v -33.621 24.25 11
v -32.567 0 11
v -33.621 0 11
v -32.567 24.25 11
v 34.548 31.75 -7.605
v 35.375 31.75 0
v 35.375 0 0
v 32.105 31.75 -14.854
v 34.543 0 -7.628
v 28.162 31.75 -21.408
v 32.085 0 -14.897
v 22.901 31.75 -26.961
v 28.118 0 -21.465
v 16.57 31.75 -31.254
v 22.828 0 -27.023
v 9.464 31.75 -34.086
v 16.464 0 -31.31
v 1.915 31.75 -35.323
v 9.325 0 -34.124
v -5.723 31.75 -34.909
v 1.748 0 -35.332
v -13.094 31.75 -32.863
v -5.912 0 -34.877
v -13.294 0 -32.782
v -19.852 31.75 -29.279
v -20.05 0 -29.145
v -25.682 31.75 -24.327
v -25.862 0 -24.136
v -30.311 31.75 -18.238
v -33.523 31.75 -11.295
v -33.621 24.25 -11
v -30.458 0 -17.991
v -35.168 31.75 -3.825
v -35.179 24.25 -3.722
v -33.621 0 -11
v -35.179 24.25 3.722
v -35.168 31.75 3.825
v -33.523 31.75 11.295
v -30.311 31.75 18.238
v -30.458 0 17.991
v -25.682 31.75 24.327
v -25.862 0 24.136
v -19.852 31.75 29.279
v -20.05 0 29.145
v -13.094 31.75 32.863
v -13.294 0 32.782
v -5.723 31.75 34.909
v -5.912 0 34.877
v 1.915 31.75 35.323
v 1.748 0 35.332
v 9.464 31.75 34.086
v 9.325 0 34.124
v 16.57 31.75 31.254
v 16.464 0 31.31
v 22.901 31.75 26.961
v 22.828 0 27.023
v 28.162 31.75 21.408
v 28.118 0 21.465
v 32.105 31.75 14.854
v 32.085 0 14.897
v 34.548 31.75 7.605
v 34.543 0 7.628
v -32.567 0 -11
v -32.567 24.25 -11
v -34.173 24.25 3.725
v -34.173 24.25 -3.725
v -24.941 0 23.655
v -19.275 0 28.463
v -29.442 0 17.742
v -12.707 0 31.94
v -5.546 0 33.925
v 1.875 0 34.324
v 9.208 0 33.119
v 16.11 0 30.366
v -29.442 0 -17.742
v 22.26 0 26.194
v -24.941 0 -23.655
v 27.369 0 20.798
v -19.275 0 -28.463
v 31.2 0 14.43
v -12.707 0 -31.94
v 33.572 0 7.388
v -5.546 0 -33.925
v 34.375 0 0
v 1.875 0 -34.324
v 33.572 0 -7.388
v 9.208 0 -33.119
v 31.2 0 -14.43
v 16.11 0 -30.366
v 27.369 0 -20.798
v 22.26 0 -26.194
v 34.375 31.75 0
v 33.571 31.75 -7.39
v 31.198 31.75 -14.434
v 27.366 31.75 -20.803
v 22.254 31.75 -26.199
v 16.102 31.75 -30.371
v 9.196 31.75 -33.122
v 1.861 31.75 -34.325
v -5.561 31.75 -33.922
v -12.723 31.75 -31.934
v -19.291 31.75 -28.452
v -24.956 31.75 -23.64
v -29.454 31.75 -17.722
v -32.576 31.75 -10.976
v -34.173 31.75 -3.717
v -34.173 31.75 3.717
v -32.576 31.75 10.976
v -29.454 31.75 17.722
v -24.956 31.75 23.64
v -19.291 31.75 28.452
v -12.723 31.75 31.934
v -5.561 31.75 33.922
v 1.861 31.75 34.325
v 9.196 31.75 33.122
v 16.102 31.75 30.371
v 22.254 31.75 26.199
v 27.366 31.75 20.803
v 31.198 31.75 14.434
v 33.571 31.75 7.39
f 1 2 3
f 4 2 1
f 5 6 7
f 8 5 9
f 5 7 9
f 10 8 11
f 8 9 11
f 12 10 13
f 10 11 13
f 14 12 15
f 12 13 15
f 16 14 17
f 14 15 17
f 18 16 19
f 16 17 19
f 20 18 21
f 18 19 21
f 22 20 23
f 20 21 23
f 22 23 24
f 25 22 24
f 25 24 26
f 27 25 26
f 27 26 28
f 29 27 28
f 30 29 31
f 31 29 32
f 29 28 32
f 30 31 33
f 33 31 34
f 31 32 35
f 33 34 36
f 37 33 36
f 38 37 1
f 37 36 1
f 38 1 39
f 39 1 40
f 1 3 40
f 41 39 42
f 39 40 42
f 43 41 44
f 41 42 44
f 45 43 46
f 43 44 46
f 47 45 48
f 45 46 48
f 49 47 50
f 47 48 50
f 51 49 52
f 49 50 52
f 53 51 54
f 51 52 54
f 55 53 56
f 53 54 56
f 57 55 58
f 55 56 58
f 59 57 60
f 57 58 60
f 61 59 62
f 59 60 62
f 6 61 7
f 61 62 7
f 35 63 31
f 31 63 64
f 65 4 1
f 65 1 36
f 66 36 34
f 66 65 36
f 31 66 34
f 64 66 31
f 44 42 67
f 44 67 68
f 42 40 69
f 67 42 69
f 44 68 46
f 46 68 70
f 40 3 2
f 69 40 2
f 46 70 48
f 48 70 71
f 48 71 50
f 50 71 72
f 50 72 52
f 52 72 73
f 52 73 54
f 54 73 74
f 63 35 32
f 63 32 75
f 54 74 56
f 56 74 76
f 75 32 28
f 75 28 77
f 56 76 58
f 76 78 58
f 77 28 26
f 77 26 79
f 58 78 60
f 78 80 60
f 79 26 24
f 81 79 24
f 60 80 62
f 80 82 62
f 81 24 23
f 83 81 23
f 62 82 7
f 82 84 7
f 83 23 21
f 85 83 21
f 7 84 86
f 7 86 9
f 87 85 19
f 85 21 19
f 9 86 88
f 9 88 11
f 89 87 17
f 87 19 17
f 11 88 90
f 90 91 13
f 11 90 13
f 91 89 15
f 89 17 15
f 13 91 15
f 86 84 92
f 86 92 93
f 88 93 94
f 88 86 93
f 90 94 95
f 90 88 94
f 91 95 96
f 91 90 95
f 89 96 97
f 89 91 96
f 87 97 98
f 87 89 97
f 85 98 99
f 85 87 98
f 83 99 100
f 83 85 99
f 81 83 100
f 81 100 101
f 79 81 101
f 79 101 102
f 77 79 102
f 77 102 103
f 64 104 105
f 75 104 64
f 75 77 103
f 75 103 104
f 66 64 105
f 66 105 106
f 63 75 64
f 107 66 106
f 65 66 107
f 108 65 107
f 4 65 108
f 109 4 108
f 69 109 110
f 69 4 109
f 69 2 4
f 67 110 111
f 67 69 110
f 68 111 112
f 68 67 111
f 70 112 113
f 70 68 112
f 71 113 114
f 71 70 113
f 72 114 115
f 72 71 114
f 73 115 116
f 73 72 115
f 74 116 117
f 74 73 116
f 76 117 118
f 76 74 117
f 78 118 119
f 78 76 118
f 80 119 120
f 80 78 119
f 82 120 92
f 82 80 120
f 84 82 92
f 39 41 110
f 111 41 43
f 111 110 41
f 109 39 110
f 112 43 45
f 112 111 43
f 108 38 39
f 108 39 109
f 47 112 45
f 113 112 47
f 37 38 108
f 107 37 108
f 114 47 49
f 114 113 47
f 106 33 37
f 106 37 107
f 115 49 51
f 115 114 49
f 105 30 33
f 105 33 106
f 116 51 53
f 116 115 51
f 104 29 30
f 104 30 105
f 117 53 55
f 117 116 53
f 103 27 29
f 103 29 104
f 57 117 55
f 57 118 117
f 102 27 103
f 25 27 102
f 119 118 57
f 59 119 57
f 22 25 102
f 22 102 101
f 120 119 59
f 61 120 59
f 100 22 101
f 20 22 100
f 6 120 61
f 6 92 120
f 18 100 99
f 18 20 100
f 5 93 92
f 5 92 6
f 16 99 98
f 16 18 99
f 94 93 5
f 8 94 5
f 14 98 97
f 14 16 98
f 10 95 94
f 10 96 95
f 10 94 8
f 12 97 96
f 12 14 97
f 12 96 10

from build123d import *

# Parameters (mm, degrees)
SKETCH1_R           = 35.375
SKETCH1_R_2         = 34.375
BOSS_EXTRUDE1_DEPTH = 31.75
SKETCH2_W           = 22
SKETCH2_H           = 24.25
CUT_EXTRUDE1_DEPTH  = 43


with BuildPart() as part:
    # Sketch1 → Boss-Extrude1 (new body)
    with BuildSketch(Plane(origin=(0, 0, 0), x_dir=(1, 0, 0), z_dir=(0, 1, 0))):
        Circle(SKETCH1_R)
        Circle(SKETCH1_R_2, mode=Mode.SUBTRACT)
    extrude(amount=BOSS_EXTRUDE1_DEPTH)

    # Sketch2 → Cut-Extrude1 (cut)
    with BuildSketch(Plane(origin=(0, 0, 0), x_dir=(0, 0, -1), z_dir=(1, 0, 0))):
        with Locations((0, 12.125)):
            Rectangle(SKETCH2_W, SKETCH2_H)
    extrude(amount=-CUT_EXTRUDE1_DEPTH, mode=Mode.SUBTRACT)


solid = part.part
